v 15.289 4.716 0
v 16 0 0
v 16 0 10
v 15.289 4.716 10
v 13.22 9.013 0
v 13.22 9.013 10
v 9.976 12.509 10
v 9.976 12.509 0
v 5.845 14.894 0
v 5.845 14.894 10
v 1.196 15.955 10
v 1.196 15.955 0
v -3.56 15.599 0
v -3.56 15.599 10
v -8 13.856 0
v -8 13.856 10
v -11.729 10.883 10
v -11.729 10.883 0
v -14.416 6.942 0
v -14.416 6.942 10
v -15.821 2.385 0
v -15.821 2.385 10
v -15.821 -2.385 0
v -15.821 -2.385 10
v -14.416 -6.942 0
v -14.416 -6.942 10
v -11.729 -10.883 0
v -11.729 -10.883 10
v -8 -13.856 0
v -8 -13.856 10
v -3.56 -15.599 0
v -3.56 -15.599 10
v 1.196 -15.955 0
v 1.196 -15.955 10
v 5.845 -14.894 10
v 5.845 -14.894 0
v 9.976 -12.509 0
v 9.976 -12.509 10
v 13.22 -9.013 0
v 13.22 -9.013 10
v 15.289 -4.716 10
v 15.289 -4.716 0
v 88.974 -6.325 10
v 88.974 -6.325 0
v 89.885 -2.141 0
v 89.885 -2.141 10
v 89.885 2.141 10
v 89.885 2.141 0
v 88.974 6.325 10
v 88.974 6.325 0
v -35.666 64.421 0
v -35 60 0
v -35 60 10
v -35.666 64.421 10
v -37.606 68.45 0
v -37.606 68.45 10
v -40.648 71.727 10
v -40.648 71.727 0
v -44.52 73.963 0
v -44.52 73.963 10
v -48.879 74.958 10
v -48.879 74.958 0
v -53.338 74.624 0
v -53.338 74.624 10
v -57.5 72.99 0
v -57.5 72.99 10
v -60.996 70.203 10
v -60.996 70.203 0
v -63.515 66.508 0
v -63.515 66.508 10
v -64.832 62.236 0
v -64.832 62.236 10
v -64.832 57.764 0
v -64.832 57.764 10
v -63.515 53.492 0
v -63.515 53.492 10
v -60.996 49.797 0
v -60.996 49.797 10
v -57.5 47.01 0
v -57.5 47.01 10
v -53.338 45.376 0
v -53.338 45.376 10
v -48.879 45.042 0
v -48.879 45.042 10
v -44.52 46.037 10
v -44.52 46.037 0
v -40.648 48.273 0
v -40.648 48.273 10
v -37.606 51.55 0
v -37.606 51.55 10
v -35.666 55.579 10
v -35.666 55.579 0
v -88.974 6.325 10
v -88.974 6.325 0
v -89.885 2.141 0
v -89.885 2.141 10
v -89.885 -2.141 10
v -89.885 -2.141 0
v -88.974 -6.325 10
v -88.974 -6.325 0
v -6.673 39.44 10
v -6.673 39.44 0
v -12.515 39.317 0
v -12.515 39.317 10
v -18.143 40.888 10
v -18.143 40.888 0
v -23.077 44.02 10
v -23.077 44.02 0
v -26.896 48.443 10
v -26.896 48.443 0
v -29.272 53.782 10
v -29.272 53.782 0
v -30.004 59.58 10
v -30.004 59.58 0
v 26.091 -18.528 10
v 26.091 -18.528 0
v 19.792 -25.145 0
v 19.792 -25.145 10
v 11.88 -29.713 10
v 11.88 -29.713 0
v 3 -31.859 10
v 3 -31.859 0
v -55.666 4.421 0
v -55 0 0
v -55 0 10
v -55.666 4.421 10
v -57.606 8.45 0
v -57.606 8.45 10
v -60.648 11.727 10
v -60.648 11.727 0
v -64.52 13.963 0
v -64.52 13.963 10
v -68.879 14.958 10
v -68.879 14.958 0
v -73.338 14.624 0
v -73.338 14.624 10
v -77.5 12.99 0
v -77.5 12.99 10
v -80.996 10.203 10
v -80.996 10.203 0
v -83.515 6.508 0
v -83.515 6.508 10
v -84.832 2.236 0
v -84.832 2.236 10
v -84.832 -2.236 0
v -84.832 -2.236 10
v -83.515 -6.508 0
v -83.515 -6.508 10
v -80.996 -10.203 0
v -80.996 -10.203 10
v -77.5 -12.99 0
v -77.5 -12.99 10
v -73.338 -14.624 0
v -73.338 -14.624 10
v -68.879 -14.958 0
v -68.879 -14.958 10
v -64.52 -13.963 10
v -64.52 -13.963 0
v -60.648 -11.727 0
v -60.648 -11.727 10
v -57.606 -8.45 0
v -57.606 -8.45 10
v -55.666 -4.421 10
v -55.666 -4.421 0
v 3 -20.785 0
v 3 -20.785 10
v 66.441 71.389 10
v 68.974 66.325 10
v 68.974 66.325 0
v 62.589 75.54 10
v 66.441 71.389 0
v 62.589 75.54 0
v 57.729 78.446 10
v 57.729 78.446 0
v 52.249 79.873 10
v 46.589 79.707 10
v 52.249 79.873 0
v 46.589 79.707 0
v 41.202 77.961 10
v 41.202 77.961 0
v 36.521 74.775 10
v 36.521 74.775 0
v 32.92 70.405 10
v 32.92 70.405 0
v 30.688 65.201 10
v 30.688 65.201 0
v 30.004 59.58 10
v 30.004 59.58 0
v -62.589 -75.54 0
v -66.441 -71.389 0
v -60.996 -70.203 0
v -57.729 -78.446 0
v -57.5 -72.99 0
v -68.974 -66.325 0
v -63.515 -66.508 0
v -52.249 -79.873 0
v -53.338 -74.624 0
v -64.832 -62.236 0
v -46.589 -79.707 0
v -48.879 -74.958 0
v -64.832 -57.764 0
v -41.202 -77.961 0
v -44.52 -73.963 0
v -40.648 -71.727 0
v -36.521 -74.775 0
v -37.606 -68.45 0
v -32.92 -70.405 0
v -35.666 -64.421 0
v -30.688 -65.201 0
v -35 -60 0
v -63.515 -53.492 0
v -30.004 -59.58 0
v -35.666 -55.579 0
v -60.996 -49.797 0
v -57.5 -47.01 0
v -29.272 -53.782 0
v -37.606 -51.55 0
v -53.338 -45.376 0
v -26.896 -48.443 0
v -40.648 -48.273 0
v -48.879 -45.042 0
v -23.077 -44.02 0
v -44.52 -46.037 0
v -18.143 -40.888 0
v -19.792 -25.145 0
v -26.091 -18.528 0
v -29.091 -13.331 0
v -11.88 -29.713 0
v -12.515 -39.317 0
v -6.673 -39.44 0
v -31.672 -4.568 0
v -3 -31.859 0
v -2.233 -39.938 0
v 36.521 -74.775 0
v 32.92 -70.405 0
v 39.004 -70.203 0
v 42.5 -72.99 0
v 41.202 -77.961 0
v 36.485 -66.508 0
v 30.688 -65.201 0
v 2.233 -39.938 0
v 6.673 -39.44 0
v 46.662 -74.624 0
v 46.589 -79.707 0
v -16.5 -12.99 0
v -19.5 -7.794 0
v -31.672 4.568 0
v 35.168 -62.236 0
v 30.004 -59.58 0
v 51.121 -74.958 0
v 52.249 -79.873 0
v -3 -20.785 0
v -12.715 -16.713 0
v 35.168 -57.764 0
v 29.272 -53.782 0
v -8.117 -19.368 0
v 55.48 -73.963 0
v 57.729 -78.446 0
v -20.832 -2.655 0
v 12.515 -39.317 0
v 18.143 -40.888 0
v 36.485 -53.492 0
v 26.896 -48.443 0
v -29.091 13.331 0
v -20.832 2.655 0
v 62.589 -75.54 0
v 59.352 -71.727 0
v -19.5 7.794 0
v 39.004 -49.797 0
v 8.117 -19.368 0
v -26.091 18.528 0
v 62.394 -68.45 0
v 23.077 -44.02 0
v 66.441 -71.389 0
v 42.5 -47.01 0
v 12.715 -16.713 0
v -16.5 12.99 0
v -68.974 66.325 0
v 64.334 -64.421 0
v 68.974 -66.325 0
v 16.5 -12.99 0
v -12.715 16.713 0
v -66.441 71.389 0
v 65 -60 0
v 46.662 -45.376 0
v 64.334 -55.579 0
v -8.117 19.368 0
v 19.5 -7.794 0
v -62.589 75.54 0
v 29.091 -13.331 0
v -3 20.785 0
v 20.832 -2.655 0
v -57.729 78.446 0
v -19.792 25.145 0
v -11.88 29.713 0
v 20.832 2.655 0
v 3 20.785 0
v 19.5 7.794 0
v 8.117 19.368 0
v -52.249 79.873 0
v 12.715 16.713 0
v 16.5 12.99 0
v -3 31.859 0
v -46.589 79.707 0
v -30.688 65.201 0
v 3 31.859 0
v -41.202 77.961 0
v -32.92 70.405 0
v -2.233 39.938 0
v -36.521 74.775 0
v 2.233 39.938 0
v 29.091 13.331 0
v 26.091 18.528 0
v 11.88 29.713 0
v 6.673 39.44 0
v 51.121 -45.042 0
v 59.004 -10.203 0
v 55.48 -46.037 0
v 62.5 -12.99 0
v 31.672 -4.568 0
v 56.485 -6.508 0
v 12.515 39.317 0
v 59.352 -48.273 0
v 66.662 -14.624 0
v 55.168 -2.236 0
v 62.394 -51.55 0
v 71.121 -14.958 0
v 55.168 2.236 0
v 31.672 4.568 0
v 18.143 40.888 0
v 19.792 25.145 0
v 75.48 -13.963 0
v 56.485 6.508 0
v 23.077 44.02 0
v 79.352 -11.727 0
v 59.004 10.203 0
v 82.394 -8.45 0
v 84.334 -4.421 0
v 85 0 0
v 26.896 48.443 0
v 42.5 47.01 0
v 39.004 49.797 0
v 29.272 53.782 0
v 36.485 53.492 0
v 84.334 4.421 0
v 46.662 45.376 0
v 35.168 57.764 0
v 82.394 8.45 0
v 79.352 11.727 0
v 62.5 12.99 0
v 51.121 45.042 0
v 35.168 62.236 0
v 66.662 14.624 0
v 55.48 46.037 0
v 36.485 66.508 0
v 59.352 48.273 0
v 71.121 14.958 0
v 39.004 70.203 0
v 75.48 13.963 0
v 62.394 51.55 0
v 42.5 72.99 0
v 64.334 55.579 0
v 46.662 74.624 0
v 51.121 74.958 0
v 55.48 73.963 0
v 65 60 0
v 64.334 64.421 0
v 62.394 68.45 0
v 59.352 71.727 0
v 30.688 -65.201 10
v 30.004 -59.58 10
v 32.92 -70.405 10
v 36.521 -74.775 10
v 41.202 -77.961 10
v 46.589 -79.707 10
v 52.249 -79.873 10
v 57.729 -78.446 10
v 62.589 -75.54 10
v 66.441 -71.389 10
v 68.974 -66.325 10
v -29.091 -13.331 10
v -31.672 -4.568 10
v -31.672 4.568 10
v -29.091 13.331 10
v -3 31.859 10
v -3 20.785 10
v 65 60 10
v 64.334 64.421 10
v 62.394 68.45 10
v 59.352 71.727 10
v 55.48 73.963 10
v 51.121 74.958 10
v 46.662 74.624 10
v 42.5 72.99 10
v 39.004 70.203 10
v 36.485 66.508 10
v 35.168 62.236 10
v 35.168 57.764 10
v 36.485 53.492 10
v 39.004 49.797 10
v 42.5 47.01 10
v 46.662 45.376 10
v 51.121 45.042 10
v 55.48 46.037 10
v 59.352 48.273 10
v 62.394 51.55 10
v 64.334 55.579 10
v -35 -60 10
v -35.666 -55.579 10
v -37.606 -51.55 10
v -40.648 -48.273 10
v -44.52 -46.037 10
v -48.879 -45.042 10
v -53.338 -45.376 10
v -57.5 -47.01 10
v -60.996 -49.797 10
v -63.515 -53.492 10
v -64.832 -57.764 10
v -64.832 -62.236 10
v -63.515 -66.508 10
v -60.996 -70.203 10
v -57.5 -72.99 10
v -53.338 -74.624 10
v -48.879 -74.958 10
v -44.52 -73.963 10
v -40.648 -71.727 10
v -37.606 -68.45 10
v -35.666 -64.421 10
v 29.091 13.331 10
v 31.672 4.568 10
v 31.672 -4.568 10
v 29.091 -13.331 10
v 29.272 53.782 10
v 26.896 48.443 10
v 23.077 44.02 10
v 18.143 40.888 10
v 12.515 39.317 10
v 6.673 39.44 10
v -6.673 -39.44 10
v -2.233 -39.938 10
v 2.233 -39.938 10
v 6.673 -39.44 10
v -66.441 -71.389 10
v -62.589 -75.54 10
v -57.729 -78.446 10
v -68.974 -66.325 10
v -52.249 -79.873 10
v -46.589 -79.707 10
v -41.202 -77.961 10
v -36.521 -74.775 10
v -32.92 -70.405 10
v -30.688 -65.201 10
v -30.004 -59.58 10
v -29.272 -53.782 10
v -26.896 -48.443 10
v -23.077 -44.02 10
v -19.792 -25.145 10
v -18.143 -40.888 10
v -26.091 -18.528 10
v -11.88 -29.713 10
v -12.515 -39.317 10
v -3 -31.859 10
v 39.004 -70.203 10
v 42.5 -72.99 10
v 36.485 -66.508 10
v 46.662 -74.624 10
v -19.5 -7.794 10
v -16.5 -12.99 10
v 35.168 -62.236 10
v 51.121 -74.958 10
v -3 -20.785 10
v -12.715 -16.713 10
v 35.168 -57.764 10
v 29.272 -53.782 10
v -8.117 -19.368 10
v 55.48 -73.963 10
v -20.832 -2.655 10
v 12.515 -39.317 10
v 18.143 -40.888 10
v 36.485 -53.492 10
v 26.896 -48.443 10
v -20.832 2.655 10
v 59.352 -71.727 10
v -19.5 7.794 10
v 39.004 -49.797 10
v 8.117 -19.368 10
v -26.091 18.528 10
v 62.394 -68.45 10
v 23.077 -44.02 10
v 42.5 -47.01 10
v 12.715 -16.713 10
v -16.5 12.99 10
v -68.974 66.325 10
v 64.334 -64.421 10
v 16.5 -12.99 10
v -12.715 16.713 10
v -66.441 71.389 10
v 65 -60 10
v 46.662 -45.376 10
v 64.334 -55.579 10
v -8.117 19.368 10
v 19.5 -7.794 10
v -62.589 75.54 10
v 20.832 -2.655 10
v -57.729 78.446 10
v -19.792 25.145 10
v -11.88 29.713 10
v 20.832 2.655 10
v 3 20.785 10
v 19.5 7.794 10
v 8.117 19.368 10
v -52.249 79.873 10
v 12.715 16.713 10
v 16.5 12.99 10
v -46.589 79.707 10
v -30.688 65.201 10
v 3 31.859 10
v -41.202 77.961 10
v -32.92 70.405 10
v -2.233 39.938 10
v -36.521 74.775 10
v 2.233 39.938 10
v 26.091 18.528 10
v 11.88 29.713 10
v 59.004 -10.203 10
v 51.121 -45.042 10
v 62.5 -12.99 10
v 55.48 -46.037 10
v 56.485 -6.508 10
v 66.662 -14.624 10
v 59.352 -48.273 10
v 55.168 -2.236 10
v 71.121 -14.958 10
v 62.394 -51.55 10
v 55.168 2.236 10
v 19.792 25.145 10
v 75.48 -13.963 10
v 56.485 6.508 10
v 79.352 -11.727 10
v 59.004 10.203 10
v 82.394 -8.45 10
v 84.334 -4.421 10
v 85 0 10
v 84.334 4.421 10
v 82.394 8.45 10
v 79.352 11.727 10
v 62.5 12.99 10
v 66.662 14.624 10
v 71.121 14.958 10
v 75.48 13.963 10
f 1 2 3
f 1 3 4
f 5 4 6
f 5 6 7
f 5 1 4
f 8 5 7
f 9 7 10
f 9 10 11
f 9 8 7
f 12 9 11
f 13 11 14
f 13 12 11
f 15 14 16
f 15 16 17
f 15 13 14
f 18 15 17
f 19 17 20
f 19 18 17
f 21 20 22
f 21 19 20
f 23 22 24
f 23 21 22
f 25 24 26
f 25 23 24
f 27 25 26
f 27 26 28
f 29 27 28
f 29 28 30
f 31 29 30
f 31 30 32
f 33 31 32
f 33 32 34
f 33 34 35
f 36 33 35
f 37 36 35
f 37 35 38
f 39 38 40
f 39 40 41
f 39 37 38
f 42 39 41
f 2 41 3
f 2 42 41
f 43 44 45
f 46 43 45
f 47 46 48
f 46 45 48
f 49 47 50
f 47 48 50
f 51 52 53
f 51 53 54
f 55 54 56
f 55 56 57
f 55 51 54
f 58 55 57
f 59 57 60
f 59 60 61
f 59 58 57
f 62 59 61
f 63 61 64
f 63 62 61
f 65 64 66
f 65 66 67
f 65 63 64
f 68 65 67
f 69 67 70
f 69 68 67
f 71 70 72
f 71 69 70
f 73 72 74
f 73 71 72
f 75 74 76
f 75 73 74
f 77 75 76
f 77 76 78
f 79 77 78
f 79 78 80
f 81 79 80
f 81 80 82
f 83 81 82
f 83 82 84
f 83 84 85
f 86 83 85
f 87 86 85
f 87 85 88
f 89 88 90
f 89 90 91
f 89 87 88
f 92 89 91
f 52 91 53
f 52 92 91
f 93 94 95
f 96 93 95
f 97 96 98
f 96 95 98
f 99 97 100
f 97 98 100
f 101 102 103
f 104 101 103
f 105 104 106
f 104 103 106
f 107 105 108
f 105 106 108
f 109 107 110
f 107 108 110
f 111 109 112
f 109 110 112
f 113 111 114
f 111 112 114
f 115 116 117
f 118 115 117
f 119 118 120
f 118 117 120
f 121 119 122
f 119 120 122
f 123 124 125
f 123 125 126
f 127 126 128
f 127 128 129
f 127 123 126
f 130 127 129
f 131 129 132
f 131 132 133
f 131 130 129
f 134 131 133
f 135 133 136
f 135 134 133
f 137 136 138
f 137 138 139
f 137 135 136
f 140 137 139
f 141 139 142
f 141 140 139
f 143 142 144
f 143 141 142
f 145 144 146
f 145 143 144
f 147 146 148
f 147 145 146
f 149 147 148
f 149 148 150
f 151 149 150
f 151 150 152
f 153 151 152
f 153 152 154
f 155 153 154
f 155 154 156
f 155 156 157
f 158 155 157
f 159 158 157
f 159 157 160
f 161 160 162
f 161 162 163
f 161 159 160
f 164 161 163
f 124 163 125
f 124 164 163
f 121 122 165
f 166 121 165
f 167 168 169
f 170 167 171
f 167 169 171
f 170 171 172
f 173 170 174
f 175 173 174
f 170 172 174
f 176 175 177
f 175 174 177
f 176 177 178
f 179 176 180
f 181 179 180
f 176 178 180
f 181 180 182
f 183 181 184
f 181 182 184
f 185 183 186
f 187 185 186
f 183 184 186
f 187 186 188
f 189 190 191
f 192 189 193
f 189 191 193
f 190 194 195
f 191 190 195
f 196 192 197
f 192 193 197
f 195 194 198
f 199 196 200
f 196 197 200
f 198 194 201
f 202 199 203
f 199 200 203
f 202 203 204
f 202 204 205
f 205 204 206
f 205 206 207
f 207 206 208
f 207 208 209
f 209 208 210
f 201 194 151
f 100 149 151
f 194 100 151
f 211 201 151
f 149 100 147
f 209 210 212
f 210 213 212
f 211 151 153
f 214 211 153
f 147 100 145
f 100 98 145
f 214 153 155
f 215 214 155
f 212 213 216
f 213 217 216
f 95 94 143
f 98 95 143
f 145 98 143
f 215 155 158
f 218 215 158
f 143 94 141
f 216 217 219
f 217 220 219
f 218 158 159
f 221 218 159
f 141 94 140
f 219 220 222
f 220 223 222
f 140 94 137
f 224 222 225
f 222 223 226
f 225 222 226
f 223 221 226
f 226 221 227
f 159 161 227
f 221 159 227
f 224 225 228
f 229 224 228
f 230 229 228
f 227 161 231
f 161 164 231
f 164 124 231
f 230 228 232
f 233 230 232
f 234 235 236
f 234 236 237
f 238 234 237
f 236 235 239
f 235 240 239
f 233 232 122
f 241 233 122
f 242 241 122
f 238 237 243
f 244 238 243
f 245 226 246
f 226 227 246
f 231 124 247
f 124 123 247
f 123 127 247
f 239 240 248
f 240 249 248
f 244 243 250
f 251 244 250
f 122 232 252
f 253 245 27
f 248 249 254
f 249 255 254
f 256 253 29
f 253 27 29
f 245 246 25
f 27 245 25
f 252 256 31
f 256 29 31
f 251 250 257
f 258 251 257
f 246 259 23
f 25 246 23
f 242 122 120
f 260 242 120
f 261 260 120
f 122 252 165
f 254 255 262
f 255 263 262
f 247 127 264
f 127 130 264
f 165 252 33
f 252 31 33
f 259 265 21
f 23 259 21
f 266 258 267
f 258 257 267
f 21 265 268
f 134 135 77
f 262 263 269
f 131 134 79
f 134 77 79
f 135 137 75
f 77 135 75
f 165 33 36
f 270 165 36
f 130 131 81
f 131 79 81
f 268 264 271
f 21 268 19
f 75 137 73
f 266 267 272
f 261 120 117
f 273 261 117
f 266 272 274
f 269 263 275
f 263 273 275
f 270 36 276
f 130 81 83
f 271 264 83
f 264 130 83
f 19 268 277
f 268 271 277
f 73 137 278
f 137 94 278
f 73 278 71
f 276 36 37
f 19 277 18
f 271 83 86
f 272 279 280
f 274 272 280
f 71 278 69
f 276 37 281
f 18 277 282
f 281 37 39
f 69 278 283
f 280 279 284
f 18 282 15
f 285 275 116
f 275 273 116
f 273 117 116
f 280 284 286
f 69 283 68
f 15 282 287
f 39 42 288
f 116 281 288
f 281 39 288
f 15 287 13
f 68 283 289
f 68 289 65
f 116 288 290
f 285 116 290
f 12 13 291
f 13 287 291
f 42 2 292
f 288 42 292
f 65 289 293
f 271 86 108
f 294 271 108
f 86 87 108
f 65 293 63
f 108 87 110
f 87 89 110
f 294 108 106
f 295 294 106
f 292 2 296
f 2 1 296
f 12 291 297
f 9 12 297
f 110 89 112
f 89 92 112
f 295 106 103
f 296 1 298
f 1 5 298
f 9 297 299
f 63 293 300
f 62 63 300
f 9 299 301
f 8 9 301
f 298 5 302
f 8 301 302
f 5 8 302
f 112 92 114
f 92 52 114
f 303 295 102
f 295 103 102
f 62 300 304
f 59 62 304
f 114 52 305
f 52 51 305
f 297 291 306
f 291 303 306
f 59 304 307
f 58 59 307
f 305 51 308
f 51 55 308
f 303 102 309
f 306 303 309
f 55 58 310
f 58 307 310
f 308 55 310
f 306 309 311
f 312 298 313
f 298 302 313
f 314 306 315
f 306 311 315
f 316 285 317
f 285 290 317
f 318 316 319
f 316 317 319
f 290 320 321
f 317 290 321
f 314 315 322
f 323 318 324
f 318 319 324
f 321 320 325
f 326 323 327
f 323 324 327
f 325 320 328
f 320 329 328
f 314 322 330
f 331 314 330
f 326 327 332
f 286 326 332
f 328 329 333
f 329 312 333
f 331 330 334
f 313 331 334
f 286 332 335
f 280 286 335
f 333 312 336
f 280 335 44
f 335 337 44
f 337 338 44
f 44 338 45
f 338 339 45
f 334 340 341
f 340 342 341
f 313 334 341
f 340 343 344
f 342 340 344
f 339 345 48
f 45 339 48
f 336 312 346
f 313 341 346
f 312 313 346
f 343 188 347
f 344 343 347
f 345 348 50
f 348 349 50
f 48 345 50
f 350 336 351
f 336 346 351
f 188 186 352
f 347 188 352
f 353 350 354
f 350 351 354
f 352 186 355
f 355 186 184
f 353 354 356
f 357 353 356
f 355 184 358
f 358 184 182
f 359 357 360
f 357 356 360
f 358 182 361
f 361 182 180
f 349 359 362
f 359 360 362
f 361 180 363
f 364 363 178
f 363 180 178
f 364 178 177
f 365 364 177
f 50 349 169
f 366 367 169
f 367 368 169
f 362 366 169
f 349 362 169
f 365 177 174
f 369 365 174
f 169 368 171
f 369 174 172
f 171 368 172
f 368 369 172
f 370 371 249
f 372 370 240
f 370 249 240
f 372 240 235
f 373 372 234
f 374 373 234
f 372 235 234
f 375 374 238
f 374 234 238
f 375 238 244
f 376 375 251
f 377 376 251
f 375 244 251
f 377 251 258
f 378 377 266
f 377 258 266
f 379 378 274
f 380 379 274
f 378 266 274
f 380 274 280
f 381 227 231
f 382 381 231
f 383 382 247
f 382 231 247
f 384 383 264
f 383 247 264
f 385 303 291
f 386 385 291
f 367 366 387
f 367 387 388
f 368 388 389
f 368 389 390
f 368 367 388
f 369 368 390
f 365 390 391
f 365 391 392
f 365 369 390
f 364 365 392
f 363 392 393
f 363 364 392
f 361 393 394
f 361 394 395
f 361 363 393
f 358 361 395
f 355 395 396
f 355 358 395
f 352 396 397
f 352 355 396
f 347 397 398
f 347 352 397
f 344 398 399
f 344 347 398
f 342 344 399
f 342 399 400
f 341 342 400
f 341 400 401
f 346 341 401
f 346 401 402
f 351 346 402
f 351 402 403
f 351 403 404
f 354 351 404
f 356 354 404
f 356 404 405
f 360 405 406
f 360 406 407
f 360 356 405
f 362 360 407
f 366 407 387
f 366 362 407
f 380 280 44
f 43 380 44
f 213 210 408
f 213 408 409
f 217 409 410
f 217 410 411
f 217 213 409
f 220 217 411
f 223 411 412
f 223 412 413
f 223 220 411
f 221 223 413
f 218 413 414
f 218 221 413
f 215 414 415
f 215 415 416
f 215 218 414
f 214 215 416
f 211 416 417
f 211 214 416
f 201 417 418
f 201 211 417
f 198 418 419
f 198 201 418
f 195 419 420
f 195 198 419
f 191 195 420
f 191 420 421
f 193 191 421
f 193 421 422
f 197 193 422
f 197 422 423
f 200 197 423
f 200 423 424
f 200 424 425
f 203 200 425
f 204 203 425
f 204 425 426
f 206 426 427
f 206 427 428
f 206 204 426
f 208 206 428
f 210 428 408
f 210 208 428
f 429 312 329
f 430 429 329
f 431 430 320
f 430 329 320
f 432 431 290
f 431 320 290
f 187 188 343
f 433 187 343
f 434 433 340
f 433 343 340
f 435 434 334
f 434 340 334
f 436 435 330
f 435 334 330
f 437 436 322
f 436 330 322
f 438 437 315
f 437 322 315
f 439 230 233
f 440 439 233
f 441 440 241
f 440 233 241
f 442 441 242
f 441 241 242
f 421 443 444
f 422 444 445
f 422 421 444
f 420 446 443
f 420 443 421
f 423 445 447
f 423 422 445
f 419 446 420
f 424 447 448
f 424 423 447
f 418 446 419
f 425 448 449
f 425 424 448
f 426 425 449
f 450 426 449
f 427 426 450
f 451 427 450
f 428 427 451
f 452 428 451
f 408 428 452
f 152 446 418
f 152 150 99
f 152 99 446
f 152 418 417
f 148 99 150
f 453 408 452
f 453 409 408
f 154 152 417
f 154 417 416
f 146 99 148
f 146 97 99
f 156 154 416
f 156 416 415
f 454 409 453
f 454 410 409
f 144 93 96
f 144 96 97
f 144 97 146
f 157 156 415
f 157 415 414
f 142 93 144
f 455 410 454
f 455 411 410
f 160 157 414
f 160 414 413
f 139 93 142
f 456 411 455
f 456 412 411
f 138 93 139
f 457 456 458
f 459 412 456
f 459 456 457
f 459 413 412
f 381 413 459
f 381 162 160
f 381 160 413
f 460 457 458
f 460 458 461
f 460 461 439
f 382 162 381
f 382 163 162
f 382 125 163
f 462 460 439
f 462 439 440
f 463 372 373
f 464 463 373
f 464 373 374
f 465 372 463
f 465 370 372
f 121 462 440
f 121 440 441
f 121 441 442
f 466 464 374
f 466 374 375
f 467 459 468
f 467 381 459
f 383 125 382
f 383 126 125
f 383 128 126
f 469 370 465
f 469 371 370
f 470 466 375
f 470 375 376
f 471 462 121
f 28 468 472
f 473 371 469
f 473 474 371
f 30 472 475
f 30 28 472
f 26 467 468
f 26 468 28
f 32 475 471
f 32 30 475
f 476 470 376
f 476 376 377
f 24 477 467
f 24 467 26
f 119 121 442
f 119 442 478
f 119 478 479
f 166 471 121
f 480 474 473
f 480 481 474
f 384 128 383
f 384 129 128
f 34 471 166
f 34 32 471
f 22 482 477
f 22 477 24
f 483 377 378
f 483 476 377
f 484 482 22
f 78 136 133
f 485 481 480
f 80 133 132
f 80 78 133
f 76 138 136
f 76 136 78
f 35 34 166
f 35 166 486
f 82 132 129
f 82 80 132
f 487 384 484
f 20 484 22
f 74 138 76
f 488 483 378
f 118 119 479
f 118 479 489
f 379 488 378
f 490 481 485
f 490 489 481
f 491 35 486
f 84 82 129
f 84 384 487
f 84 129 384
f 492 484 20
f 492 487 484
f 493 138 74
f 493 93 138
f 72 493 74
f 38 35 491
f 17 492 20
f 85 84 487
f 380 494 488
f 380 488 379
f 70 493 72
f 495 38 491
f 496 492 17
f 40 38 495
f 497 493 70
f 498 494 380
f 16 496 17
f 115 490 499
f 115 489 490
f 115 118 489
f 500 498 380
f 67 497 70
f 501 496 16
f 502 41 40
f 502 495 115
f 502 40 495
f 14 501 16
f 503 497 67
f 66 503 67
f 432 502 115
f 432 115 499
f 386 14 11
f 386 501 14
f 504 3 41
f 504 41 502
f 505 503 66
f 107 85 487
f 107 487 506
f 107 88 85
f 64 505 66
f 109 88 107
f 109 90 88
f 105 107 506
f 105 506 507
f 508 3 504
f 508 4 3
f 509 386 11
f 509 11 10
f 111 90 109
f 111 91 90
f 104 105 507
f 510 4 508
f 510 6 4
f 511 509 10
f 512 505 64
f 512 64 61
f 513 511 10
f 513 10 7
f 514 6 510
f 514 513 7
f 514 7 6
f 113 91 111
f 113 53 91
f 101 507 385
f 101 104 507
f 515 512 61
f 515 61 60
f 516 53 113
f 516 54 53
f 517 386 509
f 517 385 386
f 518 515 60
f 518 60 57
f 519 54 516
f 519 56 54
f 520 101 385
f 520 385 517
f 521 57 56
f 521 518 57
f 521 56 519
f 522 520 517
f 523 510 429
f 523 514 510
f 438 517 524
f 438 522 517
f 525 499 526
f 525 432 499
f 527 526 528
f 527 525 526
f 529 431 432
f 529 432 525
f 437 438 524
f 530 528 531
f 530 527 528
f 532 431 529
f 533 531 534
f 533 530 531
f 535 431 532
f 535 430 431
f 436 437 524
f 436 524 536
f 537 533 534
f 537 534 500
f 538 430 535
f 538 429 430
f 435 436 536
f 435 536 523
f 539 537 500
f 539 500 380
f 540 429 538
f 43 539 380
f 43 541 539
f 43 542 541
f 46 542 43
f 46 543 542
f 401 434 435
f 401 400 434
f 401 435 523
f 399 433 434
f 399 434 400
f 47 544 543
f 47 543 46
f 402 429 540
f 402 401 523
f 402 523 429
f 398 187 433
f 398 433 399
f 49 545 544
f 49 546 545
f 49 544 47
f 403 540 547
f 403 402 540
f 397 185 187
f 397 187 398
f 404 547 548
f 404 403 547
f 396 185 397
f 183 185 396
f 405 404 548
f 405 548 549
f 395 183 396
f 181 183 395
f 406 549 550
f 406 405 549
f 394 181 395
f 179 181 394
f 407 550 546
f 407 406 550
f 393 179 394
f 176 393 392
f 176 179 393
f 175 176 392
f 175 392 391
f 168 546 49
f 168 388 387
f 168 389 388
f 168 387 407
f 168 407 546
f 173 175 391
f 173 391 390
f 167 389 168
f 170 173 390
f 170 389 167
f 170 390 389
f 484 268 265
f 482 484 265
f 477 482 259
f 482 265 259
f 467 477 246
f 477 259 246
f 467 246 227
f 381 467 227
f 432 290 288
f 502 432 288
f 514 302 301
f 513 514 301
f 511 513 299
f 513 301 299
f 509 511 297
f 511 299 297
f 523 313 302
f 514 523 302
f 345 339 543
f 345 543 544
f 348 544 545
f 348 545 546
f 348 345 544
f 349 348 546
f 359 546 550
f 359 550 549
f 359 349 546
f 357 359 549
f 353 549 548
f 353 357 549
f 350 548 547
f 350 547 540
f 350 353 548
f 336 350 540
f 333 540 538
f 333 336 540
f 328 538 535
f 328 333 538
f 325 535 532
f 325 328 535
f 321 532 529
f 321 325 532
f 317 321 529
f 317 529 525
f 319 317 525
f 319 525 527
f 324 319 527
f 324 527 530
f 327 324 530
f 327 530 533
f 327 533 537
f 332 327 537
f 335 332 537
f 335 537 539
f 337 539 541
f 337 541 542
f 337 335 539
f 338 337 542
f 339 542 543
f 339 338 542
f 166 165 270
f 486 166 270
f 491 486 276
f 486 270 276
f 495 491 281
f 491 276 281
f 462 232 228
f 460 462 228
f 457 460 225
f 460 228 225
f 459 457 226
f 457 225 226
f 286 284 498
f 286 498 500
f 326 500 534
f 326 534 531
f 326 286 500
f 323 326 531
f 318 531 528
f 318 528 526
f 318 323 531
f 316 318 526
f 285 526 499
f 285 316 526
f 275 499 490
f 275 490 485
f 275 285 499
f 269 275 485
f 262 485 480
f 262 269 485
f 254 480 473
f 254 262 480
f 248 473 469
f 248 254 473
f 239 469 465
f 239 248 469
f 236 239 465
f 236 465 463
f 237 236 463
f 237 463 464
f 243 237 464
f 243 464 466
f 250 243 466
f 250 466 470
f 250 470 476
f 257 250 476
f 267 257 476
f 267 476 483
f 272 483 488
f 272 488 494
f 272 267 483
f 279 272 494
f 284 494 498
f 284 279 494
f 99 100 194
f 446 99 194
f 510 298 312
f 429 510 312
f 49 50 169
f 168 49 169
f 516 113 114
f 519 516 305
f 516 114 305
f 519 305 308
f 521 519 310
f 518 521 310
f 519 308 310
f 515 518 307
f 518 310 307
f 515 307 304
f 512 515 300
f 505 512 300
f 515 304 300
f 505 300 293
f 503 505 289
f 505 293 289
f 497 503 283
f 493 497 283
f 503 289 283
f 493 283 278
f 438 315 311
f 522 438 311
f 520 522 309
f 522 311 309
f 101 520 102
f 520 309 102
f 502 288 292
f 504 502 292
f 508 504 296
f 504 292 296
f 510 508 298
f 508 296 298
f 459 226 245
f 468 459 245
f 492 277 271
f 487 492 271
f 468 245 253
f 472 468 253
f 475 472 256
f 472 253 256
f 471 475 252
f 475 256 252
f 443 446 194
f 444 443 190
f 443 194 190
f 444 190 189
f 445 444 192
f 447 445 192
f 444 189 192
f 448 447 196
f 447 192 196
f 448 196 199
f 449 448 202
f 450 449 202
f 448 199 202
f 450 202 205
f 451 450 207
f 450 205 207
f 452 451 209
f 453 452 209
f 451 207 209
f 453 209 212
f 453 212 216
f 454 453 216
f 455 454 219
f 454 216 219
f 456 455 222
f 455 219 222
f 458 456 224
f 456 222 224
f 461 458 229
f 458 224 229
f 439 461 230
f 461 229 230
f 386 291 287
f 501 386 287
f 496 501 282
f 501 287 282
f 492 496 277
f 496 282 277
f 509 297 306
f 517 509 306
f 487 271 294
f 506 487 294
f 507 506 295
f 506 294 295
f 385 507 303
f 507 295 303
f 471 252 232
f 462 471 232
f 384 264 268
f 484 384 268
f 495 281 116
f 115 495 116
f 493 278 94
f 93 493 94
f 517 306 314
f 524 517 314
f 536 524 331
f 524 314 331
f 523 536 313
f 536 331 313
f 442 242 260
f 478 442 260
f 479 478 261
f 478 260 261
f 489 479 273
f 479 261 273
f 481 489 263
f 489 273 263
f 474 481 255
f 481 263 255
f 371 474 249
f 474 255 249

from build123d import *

# Parameters (mm, degrees)
SKETCH1_R           = 15
SKETCH1_R_2         = 16
BOSS_EXTRUDE1_DEPTH = 10


with BuildPart() as part:
    # Sketch1 → Boss-Extrude1 (new body)
    with BuildSketch(Plane.XY):
        with BuildLine():
            Line((88.973665961, 6.32455532), (68.973665961, 66.32455532))
            ThreePointArc((68.973665961, 66.32455532), (46.589060398, 79.706990918), (30.004417802, 59.579651831))
            ThreePointArc((30.004417802, 59.579651831), (23.077468599, 44.01959324), (6.67255707, 39.439535775))
            ThreePointArc((6.67255707, 39.439535775), (0, 40), (-6.67255707, 39.439535775))
            ThreePointArc((-6.67255707, 39.439535775), (-23.077468599, 44.01959324), (-30.004417802, 59.579651831))
            ThreePointArc((-30.004417802, 59.579651831), (-46.589060398, 79.706990918), (-68.973665961, 66.32455532))
            Line((-68.973665961, 66.32455532), (-88.973665961, 6.32455532))
            ThreePointArc((-88.973665961, 6.32455532), (-90, 0), (-88.973665961, -6.32455532))
            Line((-88.973665961, -6.32455532), (-68.973665961, -66.32455532))
            ThreePointArc((-68.973665961, -66.32455532), (-46.589060398, -79.706990918), (-30.004417802, -59.579651831))
            ThreePointArc((-30.004417802, -59.579651831), (-23.077468599, -44.01959324), (-6.67255707, -39.439535775))
            ThreePointArc((-6.67255707, -39.439535775), (0, -40), (6.67255707, -39.439535775))
            ThreePointArc((6.67255707, -39.439535775), (23.077468599, -44.01959324), (30.004417802, -59.579651831))
            ThreePointArc((30.004417802, -59.579651831), (46.589060398, -79.706990918), (68.973665961, -66.32455532))
            Line((68.973665961, -66.32455532), (88.973665961, -6.32455532))
            ThreePointArc((88.973665961, -6.32455532), (90, 0), (88.973665961, 6.32455532))
        make_face()
        with Locations((-50, -60)):
            Circle(SKETCH1_R, mode=Mode.SUBTRACT)
        with BuildLine():
            ThreePointArc((-16.5, -12.990381057), (-10.5, -18.186533479), (-3, -20.784609691))
            Line((-3, -20.784609691), (-3, -31.859064644))
            ThreePointArc((-3, -31.859064644), (-16, -27.712812921), (-26.090759323, -18.527608533))
            Line((-26.090759323, -18.527608533), (-16.5, -12.990381057))
        make_face(mode=Mode.SUBTRACT)
        with Locations((50, -60)):
            Circle(SKETCH1_R, mode=Mode.SUBTRACT)
        with BuildLine():
            Line((3, -31.859064644), (3, -20.784609691))
            ThreePointArc((3, -20.784609691), (10.5, -18.186533479), (16.5, -12.990381057))
            Line((16.5, -12.990381057), (26.090759323, -18.527608533))
            ThreePointArc((26.090759323, -18.527608533), (16, -27.712812921), (3, -31.859064644))
        make_face(mode=Mode.SUBTRACT)
        with BuildLine():
            ThreePointArc((-19.5, 7.794228634), (-21, 0), (-19.5, -7.794228634))
            Line((-19.5, -7.794228634), (-29.090759323, -13.331456111))
            ThreePointArc((-29.090759323, -13.331456111), (-32, 0), (-29.090759323, 13.331456111))
            Line((-29.090759323, 13.331456111), (-19.5, 7.794228634))
        make_face(mode=Mode.SUBTRACT)
        Circle(SKETCH1_R_2, mode=Mode.SUBTRACT)
        with BuildLine():
            ThreePointArc((-3, 20.784609691), (-10.5, 18.186533479), (-16.5, 12.990381057))
            Line((-16.5, 12.990381057), (-26.090759323, 18.527608533))
            ThreePointArc((-26.090759323, 18.527608533), (-16, 27.712812921), (-3, 31.859064644))
            Line((-3, 31.859064644), (-3, 20.784609691))
        make_face(mode=Mode.SUBTRACT)
        with Locations((-50, 60)):
            Circle(SKETCH1_R, mode=Mode.SUBTRACT)
        with BuildLine():
            ThreePointArc((19.5, -7.794228634), (21, 0), (19.5, 7.794228634))
            Line((19.5, 7.794228634), (29.090759323, 13.331456111))
            ThreePointArc((29.090759323, 13.331456111), (32, 0), (29.090759323, -13.331456111))
            Line((29.090759323, -13.331456111), (19.5, -7.794228634))
        make_face(mode=Mode.SUBTRACT)
        with BuildLine():
            ThreePointArc((16.5, 12.990381057), (10.5, 18.186533479), (3, 20.784609691))
            Line((3, 20.784609691), (3, 31.859064644))
            ThreePointArc((3, 31.859064644), (16, 27.712812921), (26.090759323, 18.527608533))
            Line((26.090759323, 18.527608533), (16.5, 12.990381057))
        make_face(mode=Mode.SUBTRACT)
        with Locations((70, 0)):
            Circle(SKETCH1_R, mode=Mode.SUBTRACT)
        with Locations((50, 60)):
            Circle(SKETCH1_R, mode=Mode.SUBTRACT)
        with Locations((-70, 0)):
            Circle(SKETCH1_R, mode=Mode.SUBTRACT)
    extrude(amount=BOSS_EXTRUDE1_DEPTH)


solid = part.part
